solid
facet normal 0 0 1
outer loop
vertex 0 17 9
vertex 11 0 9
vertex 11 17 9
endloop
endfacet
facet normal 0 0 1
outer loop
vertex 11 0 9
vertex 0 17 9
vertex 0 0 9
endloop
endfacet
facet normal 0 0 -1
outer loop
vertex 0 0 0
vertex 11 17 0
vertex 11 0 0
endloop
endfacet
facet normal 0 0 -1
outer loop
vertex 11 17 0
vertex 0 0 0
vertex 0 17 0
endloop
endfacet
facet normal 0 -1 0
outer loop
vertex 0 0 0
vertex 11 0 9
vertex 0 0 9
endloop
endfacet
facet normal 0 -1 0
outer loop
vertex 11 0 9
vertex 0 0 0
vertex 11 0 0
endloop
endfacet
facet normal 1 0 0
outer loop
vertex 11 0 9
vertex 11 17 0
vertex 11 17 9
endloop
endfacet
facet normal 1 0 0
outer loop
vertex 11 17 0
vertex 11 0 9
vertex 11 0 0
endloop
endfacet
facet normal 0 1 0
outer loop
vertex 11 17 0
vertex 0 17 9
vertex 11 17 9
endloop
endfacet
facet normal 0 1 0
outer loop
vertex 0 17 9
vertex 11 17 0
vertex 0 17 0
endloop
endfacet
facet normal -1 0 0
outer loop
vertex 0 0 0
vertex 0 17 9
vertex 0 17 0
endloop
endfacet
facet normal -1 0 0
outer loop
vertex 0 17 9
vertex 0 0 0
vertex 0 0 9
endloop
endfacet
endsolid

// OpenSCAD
// Generated by SolidPython 1.0.1 on 2020-07-29 00:46:55


cube(size = [11, 17, 9]);
/***********************************************
*********      SolidPython code:      **********
************************************************
 
# import packages: SolidPython
from solid import *
from solid.utils import *
from itertools import chain, combinations, permutations


class Resize:

    def __init__(self, scad_file):
        self.scad_file = scad_file
        #self.scad_file = import_scad(scad_file)
        # cone/cylinder param:
        self.r1 = 0
        self.r2 = 0
        self.h = 0
        # rectangular prism param:
        self.w = 0
        self.l = 0
        # ellipse param:
        self.r = 0

    # import OpenScad code (file name corresponds to shape)


    # classify shape + parameters
    def assign(self, param1, param2, param3):
        if self.scad_file == 'cone.scad':
            self.r1 = param1
            self.r2 = param2
            self.h = param3
        elif self.scad_file == 'cylinder.scad':
            self.r1 = param1
            self.r2 = param2
            self.h = param3
        elif self.scad_file == 'rectangularPrism.scad':
            self.h = param1
            self.l = param2
            self.w = param3
        else:
            self.r = param1
            self.h = param2

    # resize parameters
    def iterate(self):
        x = range(3, 20, 2)
        i = 1
        if self.scad_file == 'cone.scad':
            tempList = list(permutations(x, 2))
            for temp in tempList:
                param1 = temp[0]
                param2 = temp[1]
                filepath = 'produced_scad_files/' + 'cone' + str(param1) + '_' + str(param2) + '_' + '.scad'
                scad_render_to_file(cylinder(h=param1, r1=param2, r2=0), filepath)

        elif self.scad_file == 'cylinder.scad':
            tempList = list(permutations(x, 3))
            for temp in tempList:
                param1 = temp[0]
                param2 = temp[1]
                filepath = 'produced_scad_files/' + 'cylinder' + str(param1) + '_' + str(param2) + '_' + '.scad'
                scad_render_to_file(cylinder(h=param1, r1=param2, r2=param2), filepath)

        elif self.scad_file == 'rectangularPrism.scad':
            tempList = list(permutations(x, 3))
            for temp in tempList:
                param1 = temp[0]
                param2 = temp[1]
                param3 = temp[2]
                filepath = 'produced_scad_files/' + 'rectangularPrism' + str(param1) + '_' + str(param2) + '_' + str(
                    param3) + '.scad'
                scad_render_to_file(cube(size=(param1, param2, param3)), filepath)

        elif self.scad_file == 'ellipse.scad':
            tempList = list(permutations(x, 4))
            for temp in tempList:
                param1 = temp[0]
                param2 = temp[1]
                param3 = temp[2]
                param4 = temp[3]
                filepath = 'produced_scad_files/' + 'ellipse' + str(param1) + '_' + str(param2) + '_' + str(param3) + '_' + str(param4) + '.scad'
                scad_render_to_file(scale([param1, param2, param3])(sphere(r=param4)), filepath)

    def render_to_scadfile(self):
        scad_render_to_file(scad, 'example.scad') 
 
************************************************/
